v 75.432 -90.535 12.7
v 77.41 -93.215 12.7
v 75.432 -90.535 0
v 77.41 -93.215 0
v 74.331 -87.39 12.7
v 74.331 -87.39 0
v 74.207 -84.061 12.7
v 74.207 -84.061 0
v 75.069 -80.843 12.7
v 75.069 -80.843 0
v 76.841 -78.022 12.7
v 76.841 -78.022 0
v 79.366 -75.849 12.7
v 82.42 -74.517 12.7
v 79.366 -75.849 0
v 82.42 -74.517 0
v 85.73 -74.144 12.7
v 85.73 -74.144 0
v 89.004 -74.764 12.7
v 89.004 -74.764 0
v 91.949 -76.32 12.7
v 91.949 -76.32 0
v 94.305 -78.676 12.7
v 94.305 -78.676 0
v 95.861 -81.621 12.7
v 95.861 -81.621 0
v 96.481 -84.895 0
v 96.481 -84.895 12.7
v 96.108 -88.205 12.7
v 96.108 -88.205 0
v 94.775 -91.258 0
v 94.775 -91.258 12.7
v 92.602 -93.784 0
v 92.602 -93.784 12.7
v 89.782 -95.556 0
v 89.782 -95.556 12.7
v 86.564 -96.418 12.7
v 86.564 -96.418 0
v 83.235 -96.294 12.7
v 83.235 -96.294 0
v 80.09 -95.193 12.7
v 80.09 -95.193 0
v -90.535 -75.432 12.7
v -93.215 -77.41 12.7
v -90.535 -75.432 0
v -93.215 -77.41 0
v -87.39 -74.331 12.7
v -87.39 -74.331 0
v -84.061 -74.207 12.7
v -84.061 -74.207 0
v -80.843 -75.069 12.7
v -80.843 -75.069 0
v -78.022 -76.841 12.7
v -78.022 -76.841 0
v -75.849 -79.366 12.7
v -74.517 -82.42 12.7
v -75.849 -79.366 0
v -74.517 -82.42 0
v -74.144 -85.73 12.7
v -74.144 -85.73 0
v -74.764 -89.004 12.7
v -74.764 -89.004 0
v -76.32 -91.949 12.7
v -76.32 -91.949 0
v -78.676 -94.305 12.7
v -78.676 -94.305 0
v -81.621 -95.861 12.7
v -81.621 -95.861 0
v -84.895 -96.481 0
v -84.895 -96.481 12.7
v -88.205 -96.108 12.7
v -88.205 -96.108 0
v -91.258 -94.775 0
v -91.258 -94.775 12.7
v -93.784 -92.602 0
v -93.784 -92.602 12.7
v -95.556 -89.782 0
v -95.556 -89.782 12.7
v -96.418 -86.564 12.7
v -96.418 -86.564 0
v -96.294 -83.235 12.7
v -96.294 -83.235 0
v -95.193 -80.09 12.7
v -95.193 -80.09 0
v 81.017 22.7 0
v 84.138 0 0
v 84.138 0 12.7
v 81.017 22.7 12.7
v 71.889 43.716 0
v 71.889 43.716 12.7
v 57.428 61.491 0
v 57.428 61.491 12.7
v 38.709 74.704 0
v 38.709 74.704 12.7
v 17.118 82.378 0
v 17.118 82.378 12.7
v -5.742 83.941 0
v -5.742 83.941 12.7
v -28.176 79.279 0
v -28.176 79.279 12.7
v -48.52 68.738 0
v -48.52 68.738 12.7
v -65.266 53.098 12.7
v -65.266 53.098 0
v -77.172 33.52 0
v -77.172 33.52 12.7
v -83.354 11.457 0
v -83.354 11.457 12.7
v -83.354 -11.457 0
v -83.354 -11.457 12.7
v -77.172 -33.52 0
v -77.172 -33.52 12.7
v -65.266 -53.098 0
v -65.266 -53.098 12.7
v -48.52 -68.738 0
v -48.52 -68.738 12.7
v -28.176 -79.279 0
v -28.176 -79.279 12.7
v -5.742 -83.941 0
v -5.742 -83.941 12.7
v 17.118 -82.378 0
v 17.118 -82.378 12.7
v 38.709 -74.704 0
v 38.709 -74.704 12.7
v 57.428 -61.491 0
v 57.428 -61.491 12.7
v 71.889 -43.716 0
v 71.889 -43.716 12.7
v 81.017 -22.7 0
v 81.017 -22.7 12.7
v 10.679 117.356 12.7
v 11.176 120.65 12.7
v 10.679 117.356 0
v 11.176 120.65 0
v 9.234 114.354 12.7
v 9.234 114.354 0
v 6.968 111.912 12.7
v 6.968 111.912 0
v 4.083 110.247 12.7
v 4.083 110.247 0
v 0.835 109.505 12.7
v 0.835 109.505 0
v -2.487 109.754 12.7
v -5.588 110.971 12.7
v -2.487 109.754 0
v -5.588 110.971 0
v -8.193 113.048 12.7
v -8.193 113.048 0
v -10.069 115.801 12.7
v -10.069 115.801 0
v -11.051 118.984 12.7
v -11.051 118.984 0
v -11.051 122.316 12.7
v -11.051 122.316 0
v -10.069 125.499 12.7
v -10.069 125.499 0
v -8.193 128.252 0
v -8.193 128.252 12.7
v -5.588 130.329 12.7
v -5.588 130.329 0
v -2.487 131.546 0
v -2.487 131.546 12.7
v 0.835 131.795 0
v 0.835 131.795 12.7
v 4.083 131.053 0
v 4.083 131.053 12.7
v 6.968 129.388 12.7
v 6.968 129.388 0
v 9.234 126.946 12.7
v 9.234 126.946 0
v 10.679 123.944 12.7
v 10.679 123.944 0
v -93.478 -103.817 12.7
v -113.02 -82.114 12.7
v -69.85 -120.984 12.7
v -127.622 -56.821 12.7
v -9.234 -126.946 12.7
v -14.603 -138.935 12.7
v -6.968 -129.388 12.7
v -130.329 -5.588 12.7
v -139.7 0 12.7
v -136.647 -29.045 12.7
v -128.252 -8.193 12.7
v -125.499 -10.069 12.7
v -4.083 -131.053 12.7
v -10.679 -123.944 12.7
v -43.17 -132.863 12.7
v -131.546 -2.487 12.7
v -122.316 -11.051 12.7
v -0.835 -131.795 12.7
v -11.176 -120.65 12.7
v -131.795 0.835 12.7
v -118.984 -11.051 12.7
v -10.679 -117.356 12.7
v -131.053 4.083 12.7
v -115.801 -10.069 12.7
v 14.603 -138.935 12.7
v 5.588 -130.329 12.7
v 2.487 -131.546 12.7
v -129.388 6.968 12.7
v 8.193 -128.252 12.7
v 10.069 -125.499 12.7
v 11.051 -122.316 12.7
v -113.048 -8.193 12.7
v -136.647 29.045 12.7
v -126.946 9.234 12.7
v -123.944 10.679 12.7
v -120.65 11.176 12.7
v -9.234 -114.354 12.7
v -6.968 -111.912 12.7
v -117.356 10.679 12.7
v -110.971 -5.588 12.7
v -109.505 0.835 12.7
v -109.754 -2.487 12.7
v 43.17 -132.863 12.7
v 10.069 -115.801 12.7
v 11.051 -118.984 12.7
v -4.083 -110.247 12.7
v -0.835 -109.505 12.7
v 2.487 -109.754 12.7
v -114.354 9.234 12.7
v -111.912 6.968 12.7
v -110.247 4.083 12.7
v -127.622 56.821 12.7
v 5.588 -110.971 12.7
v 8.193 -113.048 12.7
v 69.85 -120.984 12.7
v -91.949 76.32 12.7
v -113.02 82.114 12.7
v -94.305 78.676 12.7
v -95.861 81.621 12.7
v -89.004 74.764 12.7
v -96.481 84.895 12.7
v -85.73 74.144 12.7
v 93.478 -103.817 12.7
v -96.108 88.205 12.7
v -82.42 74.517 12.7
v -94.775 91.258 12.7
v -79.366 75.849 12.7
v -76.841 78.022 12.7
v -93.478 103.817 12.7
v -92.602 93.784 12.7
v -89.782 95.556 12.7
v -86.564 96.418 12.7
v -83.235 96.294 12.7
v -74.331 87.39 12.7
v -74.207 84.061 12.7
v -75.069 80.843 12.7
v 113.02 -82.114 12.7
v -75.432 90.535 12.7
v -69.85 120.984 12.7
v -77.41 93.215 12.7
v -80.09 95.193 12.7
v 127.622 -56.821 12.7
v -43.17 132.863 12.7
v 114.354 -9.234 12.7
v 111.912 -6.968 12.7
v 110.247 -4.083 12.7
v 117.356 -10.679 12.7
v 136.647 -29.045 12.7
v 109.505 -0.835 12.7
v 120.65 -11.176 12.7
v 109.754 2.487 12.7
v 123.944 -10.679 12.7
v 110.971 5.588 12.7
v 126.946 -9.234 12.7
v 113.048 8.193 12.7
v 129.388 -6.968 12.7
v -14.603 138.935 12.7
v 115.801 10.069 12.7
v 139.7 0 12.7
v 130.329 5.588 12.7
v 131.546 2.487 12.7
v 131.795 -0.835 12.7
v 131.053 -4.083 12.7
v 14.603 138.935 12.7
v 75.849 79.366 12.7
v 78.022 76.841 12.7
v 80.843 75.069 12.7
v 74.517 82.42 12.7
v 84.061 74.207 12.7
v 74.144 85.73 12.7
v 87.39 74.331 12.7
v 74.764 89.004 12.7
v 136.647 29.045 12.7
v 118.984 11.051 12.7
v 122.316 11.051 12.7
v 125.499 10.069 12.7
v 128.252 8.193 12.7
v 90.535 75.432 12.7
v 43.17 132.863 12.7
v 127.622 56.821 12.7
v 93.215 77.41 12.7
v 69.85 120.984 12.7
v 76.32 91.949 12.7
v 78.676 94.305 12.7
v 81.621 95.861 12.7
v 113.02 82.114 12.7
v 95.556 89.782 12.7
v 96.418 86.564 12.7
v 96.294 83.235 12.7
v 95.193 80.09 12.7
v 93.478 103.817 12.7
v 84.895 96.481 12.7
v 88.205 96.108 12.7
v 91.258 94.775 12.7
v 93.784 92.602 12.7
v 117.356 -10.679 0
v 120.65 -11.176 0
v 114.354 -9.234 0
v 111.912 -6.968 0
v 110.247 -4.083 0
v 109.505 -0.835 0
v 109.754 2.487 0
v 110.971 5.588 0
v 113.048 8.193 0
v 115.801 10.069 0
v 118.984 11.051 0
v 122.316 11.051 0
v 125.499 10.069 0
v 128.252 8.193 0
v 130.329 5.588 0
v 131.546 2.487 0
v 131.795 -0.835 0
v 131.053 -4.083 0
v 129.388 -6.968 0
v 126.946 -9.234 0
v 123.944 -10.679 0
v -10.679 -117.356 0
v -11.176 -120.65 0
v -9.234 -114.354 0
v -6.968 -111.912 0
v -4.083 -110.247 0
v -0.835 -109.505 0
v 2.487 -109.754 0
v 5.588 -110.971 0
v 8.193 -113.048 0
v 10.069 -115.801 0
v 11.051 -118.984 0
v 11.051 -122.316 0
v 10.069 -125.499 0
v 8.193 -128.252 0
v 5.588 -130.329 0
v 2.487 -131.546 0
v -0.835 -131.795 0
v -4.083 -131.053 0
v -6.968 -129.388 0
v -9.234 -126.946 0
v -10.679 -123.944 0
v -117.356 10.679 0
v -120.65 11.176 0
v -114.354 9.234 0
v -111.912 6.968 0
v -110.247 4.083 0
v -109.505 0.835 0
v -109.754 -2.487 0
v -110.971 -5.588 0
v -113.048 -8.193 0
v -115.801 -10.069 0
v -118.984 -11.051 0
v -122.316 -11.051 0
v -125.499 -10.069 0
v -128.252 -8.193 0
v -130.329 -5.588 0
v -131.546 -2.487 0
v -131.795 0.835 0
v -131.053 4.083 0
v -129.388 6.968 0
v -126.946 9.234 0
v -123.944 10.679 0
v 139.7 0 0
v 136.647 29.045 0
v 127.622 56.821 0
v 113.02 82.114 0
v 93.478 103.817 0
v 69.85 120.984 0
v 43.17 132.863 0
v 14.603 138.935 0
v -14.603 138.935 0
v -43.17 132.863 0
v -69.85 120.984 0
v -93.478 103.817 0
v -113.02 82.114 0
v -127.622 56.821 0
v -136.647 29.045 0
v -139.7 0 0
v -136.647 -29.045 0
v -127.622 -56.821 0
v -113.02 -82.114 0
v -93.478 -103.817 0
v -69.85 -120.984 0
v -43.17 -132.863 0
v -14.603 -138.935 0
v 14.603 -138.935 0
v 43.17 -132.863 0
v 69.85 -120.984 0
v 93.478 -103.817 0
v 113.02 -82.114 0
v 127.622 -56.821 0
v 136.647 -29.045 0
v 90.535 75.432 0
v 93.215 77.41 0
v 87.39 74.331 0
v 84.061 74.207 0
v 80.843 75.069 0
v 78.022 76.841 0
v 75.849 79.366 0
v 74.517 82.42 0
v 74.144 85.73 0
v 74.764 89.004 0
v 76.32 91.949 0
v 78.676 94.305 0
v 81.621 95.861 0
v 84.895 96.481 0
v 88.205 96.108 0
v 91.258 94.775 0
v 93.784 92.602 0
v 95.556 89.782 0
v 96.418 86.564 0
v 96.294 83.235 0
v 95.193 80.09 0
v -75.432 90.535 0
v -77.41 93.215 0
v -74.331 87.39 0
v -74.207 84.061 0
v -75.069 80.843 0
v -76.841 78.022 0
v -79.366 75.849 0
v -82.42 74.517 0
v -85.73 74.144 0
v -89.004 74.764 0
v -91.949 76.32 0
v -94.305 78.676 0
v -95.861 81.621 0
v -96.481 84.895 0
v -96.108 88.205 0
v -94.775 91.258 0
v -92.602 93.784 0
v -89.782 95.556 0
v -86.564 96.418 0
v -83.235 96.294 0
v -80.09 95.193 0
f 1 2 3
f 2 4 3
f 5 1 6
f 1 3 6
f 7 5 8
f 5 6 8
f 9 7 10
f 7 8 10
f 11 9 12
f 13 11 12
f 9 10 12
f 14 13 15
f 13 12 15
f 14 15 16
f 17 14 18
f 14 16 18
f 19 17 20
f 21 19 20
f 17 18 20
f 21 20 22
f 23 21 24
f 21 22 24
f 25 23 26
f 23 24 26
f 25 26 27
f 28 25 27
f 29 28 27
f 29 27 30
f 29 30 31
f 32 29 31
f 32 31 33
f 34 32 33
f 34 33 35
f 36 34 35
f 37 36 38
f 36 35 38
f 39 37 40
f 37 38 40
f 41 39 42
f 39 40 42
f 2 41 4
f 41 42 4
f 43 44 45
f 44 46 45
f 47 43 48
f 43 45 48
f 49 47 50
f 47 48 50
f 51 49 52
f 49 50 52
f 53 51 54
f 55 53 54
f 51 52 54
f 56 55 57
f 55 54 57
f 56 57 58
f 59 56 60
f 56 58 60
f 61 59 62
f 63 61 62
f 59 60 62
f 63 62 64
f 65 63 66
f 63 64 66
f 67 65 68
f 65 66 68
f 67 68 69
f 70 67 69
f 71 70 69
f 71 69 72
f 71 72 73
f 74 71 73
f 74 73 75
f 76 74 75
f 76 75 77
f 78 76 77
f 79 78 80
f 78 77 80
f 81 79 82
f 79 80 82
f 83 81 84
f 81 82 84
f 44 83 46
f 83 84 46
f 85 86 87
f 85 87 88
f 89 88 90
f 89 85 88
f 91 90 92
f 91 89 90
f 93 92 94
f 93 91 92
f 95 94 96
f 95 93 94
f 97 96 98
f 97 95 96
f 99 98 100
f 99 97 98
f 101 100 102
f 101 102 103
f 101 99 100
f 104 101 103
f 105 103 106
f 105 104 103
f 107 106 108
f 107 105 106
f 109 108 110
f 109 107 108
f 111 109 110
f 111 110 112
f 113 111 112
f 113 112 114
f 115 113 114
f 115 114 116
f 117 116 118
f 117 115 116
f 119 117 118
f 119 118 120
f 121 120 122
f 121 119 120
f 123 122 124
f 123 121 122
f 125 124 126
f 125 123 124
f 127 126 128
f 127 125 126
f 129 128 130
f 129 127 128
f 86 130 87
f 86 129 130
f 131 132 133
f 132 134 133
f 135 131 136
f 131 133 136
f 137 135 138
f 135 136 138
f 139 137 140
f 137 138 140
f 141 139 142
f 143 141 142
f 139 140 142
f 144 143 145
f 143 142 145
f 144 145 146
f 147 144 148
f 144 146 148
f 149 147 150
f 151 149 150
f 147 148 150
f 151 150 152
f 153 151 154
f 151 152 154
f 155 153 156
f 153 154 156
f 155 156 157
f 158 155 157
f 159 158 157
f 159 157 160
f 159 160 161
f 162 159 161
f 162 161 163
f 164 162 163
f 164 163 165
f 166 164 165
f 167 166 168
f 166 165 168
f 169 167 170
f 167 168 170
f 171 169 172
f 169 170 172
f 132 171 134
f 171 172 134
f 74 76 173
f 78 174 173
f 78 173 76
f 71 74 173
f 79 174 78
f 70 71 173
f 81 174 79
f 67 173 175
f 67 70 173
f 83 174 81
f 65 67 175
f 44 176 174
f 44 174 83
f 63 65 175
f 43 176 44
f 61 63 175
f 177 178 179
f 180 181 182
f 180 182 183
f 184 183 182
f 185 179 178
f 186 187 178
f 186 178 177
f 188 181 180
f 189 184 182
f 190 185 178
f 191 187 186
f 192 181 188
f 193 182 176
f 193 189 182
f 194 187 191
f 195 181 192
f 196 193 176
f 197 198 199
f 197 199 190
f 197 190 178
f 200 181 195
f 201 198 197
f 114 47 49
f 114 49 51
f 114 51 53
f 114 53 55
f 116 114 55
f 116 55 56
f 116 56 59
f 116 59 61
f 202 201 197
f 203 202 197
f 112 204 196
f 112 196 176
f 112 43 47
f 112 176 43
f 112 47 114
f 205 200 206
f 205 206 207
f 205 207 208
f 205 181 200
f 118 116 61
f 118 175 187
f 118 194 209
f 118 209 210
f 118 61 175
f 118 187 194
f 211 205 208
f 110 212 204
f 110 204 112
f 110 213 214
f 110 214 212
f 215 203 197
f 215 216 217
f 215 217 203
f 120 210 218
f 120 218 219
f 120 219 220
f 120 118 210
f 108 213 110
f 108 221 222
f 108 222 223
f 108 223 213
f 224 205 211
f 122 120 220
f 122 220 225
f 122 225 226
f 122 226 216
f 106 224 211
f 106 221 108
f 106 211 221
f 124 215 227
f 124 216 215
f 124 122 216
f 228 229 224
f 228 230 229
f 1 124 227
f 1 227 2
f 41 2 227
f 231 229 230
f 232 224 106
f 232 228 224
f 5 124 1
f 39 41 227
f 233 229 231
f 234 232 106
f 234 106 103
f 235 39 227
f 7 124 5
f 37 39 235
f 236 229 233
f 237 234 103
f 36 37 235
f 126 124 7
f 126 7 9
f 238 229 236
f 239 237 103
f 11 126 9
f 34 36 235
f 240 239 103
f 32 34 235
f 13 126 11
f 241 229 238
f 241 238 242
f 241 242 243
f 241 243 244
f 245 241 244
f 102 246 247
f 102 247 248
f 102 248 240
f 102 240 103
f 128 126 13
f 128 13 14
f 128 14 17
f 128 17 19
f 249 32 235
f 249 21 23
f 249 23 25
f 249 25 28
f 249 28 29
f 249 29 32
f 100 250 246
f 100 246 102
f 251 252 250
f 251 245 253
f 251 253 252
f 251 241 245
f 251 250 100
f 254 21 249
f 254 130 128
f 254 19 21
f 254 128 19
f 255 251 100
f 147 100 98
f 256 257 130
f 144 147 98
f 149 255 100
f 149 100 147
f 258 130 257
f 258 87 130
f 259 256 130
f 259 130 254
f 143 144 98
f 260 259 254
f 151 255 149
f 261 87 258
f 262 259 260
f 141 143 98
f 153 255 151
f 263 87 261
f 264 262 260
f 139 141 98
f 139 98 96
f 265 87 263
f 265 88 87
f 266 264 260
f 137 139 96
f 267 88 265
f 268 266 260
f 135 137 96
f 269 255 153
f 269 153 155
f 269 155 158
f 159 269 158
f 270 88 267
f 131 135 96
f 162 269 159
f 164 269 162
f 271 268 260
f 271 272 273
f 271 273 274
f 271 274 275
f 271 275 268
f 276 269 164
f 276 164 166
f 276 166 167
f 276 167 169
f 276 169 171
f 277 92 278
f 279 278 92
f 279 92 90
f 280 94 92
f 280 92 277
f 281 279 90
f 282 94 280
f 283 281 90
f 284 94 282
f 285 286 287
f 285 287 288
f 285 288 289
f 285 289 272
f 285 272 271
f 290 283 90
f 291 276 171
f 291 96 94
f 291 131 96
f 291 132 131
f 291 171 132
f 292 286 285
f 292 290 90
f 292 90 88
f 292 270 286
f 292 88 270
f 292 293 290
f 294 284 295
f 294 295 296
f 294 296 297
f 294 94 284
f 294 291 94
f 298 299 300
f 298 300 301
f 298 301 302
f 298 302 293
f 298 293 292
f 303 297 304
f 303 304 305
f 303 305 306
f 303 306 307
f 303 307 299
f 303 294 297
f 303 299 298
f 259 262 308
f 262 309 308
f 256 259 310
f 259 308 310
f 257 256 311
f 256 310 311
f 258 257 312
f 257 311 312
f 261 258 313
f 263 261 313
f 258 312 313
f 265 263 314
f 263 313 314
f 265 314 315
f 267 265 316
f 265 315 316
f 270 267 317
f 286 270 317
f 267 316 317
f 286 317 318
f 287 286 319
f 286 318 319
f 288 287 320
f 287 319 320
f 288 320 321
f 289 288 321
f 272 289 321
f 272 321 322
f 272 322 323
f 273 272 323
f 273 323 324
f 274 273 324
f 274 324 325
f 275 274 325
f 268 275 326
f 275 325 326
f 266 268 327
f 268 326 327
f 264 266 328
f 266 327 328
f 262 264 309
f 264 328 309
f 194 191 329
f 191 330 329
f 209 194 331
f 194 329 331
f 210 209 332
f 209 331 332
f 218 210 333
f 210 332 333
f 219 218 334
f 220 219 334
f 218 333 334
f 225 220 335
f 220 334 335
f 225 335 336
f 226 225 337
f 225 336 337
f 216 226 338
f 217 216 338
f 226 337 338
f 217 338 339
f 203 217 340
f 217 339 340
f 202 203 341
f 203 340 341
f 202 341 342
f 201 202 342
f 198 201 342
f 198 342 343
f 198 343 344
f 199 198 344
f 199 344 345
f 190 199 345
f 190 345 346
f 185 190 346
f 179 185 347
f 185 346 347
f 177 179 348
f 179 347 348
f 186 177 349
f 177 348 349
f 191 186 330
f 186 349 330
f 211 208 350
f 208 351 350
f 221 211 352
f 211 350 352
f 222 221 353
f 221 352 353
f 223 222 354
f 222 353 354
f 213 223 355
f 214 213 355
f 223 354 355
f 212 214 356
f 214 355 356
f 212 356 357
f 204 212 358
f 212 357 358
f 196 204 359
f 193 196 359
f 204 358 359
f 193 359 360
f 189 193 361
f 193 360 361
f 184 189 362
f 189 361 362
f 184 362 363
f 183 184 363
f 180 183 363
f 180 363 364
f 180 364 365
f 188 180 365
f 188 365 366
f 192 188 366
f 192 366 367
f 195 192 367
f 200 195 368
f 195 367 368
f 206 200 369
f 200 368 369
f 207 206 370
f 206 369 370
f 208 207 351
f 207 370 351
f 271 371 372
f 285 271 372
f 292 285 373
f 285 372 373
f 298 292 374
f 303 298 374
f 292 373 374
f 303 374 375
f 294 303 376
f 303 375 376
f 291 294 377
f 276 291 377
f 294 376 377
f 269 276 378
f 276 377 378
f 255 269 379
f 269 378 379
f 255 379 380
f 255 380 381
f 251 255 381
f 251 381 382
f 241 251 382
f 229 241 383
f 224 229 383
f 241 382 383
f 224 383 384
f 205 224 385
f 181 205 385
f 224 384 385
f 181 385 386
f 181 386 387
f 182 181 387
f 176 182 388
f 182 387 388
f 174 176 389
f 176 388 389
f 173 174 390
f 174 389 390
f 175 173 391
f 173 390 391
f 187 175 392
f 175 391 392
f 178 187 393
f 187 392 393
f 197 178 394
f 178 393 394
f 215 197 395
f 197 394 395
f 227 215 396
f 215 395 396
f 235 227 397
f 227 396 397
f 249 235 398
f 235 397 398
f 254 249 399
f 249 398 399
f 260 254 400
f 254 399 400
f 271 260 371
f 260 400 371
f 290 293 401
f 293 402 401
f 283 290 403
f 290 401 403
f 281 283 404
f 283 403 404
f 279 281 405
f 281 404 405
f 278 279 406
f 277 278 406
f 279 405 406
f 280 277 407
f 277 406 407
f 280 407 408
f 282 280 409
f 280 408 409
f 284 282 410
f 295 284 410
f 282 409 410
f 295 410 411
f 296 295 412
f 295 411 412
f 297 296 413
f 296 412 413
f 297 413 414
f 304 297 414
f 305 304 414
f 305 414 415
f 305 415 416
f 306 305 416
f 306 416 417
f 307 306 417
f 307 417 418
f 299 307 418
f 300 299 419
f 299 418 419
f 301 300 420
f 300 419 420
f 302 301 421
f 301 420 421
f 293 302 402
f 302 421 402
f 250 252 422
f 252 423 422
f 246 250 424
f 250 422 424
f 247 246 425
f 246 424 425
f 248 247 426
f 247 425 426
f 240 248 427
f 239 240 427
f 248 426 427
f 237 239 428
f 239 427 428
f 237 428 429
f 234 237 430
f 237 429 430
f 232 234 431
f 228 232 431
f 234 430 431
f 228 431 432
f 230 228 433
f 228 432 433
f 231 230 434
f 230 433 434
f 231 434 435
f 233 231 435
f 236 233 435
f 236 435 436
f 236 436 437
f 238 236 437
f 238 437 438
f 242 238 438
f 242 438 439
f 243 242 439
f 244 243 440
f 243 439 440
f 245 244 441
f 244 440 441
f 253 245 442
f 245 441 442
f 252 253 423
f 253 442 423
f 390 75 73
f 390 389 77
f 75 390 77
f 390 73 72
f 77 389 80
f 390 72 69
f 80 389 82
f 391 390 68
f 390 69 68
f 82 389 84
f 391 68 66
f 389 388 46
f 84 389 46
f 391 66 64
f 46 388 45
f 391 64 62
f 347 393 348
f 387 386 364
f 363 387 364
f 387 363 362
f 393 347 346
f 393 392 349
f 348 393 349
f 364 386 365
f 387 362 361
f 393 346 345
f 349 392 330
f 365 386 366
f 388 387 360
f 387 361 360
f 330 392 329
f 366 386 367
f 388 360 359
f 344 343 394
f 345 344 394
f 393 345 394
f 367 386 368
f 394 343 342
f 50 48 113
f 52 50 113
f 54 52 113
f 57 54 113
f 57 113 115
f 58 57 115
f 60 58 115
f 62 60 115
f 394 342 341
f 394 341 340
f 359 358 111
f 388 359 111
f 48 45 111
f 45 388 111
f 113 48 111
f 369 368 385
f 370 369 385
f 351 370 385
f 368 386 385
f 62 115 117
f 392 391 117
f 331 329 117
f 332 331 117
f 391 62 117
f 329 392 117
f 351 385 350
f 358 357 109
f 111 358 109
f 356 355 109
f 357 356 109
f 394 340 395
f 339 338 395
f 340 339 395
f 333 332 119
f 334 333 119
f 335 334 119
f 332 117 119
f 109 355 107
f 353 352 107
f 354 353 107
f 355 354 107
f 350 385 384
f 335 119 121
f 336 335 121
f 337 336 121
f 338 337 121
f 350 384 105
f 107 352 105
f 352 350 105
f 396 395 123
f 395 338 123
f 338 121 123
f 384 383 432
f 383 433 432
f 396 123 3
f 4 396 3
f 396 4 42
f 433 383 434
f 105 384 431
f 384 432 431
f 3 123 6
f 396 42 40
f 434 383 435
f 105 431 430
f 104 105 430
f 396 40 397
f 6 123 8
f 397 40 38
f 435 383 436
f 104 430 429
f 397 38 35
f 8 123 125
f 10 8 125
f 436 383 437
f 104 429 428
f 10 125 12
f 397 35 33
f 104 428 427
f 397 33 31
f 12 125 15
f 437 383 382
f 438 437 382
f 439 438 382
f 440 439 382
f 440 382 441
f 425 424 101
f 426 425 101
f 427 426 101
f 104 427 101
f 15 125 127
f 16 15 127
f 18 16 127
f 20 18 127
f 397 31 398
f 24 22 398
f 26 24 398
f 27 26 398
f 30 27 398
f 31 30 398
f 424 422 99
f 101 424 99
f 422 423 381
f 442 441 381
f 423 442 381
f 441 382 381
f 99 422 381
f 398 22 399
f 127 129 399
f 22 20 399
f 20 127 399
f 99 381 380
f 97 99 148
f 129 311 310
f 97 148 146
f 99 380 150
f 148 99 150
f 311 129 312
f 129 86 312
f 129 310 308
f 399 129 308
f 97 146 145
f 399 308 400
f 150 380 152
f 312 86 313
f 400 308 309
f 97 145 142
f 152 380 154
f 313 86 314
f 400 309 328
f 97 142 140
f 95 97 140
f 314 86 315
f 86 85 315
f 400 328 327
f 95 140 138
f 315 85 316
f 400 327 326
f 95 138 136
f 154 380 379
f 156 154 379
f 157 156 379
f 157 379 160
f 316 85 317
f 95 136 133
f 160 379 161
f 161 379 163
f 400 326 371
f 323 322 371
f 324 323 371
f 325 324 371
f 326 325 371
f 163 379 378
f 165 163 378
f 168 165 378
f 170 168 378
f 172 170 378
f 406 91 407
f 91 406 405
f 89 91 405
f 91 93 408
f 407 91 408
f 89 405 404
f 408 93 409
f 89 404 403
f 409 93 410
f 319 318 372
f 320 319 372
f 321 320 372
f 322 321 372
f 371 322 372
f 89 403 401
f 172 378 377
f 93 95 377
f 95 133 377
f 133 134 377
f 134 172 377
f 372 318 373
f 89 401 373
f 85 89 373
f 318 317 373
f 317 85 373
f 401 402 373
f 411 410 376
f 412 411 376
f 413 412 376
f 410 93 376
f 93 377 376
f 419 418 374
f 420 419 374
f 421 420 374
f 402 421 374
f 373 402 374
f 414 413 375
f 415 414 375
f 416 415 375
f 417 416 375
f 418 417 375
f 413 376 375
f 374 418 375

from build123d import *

# Parameters (mm, degrees)
SKETCH1_R           = 139.7
SKETCH1_R_2         = 84.1375
BOSS_EXTRUDE1_DEPTH = 12.7
SKETCH2_W           = 11.176
SKETCH2_H           = 12.7
CIRPATTERN1_COUNT   = 8


with BuildPart() as part:
    # Sketch1 → Boss-Extrude1 (new body)
    with BuildSketch(Plane.XY):
        Circle(SKETCH1_R)
        Circle(SKETCH1_R_2, mode=Mode.SUBTRACT)
    extrude(amount=BOSS_EXTRUDE1_DEPTH)

    # Sketch2 → 7/8 (0.88) Diameter Hole1 (revolve, cut)
    with BuildSketch(Plane(origin=(120.65, 0, 12.7), x_dir=(0, -1, 0), z_dir=(1, 0, 0))):
        with Locations((5.588, 6.35)):
            Rectangle(SKETCH2_W, SKETCH2_H)
    f_7_8_0_88_diameter_hole1 = revolve(axis=Axis((120.65, 0, 19.05), (0, 0, -1)), mode=Mode.SUBTRACT)

    # CirPattern1: 7/8 (0.88) Diameter Hole1 ×8 about axis
    cirpattern1_axis = Axis((0, 0, 0), (0, 0, 1))
    for i in range(1, CIRPATTERN1_COUNT):
        add(f_7_8_0_88_diameter_hole1.rotate(cirpattern1_axis, i * 360 / CIRPATTERN1_COUNT), mode=Mode.SUBTRACT)


solid = part.part
